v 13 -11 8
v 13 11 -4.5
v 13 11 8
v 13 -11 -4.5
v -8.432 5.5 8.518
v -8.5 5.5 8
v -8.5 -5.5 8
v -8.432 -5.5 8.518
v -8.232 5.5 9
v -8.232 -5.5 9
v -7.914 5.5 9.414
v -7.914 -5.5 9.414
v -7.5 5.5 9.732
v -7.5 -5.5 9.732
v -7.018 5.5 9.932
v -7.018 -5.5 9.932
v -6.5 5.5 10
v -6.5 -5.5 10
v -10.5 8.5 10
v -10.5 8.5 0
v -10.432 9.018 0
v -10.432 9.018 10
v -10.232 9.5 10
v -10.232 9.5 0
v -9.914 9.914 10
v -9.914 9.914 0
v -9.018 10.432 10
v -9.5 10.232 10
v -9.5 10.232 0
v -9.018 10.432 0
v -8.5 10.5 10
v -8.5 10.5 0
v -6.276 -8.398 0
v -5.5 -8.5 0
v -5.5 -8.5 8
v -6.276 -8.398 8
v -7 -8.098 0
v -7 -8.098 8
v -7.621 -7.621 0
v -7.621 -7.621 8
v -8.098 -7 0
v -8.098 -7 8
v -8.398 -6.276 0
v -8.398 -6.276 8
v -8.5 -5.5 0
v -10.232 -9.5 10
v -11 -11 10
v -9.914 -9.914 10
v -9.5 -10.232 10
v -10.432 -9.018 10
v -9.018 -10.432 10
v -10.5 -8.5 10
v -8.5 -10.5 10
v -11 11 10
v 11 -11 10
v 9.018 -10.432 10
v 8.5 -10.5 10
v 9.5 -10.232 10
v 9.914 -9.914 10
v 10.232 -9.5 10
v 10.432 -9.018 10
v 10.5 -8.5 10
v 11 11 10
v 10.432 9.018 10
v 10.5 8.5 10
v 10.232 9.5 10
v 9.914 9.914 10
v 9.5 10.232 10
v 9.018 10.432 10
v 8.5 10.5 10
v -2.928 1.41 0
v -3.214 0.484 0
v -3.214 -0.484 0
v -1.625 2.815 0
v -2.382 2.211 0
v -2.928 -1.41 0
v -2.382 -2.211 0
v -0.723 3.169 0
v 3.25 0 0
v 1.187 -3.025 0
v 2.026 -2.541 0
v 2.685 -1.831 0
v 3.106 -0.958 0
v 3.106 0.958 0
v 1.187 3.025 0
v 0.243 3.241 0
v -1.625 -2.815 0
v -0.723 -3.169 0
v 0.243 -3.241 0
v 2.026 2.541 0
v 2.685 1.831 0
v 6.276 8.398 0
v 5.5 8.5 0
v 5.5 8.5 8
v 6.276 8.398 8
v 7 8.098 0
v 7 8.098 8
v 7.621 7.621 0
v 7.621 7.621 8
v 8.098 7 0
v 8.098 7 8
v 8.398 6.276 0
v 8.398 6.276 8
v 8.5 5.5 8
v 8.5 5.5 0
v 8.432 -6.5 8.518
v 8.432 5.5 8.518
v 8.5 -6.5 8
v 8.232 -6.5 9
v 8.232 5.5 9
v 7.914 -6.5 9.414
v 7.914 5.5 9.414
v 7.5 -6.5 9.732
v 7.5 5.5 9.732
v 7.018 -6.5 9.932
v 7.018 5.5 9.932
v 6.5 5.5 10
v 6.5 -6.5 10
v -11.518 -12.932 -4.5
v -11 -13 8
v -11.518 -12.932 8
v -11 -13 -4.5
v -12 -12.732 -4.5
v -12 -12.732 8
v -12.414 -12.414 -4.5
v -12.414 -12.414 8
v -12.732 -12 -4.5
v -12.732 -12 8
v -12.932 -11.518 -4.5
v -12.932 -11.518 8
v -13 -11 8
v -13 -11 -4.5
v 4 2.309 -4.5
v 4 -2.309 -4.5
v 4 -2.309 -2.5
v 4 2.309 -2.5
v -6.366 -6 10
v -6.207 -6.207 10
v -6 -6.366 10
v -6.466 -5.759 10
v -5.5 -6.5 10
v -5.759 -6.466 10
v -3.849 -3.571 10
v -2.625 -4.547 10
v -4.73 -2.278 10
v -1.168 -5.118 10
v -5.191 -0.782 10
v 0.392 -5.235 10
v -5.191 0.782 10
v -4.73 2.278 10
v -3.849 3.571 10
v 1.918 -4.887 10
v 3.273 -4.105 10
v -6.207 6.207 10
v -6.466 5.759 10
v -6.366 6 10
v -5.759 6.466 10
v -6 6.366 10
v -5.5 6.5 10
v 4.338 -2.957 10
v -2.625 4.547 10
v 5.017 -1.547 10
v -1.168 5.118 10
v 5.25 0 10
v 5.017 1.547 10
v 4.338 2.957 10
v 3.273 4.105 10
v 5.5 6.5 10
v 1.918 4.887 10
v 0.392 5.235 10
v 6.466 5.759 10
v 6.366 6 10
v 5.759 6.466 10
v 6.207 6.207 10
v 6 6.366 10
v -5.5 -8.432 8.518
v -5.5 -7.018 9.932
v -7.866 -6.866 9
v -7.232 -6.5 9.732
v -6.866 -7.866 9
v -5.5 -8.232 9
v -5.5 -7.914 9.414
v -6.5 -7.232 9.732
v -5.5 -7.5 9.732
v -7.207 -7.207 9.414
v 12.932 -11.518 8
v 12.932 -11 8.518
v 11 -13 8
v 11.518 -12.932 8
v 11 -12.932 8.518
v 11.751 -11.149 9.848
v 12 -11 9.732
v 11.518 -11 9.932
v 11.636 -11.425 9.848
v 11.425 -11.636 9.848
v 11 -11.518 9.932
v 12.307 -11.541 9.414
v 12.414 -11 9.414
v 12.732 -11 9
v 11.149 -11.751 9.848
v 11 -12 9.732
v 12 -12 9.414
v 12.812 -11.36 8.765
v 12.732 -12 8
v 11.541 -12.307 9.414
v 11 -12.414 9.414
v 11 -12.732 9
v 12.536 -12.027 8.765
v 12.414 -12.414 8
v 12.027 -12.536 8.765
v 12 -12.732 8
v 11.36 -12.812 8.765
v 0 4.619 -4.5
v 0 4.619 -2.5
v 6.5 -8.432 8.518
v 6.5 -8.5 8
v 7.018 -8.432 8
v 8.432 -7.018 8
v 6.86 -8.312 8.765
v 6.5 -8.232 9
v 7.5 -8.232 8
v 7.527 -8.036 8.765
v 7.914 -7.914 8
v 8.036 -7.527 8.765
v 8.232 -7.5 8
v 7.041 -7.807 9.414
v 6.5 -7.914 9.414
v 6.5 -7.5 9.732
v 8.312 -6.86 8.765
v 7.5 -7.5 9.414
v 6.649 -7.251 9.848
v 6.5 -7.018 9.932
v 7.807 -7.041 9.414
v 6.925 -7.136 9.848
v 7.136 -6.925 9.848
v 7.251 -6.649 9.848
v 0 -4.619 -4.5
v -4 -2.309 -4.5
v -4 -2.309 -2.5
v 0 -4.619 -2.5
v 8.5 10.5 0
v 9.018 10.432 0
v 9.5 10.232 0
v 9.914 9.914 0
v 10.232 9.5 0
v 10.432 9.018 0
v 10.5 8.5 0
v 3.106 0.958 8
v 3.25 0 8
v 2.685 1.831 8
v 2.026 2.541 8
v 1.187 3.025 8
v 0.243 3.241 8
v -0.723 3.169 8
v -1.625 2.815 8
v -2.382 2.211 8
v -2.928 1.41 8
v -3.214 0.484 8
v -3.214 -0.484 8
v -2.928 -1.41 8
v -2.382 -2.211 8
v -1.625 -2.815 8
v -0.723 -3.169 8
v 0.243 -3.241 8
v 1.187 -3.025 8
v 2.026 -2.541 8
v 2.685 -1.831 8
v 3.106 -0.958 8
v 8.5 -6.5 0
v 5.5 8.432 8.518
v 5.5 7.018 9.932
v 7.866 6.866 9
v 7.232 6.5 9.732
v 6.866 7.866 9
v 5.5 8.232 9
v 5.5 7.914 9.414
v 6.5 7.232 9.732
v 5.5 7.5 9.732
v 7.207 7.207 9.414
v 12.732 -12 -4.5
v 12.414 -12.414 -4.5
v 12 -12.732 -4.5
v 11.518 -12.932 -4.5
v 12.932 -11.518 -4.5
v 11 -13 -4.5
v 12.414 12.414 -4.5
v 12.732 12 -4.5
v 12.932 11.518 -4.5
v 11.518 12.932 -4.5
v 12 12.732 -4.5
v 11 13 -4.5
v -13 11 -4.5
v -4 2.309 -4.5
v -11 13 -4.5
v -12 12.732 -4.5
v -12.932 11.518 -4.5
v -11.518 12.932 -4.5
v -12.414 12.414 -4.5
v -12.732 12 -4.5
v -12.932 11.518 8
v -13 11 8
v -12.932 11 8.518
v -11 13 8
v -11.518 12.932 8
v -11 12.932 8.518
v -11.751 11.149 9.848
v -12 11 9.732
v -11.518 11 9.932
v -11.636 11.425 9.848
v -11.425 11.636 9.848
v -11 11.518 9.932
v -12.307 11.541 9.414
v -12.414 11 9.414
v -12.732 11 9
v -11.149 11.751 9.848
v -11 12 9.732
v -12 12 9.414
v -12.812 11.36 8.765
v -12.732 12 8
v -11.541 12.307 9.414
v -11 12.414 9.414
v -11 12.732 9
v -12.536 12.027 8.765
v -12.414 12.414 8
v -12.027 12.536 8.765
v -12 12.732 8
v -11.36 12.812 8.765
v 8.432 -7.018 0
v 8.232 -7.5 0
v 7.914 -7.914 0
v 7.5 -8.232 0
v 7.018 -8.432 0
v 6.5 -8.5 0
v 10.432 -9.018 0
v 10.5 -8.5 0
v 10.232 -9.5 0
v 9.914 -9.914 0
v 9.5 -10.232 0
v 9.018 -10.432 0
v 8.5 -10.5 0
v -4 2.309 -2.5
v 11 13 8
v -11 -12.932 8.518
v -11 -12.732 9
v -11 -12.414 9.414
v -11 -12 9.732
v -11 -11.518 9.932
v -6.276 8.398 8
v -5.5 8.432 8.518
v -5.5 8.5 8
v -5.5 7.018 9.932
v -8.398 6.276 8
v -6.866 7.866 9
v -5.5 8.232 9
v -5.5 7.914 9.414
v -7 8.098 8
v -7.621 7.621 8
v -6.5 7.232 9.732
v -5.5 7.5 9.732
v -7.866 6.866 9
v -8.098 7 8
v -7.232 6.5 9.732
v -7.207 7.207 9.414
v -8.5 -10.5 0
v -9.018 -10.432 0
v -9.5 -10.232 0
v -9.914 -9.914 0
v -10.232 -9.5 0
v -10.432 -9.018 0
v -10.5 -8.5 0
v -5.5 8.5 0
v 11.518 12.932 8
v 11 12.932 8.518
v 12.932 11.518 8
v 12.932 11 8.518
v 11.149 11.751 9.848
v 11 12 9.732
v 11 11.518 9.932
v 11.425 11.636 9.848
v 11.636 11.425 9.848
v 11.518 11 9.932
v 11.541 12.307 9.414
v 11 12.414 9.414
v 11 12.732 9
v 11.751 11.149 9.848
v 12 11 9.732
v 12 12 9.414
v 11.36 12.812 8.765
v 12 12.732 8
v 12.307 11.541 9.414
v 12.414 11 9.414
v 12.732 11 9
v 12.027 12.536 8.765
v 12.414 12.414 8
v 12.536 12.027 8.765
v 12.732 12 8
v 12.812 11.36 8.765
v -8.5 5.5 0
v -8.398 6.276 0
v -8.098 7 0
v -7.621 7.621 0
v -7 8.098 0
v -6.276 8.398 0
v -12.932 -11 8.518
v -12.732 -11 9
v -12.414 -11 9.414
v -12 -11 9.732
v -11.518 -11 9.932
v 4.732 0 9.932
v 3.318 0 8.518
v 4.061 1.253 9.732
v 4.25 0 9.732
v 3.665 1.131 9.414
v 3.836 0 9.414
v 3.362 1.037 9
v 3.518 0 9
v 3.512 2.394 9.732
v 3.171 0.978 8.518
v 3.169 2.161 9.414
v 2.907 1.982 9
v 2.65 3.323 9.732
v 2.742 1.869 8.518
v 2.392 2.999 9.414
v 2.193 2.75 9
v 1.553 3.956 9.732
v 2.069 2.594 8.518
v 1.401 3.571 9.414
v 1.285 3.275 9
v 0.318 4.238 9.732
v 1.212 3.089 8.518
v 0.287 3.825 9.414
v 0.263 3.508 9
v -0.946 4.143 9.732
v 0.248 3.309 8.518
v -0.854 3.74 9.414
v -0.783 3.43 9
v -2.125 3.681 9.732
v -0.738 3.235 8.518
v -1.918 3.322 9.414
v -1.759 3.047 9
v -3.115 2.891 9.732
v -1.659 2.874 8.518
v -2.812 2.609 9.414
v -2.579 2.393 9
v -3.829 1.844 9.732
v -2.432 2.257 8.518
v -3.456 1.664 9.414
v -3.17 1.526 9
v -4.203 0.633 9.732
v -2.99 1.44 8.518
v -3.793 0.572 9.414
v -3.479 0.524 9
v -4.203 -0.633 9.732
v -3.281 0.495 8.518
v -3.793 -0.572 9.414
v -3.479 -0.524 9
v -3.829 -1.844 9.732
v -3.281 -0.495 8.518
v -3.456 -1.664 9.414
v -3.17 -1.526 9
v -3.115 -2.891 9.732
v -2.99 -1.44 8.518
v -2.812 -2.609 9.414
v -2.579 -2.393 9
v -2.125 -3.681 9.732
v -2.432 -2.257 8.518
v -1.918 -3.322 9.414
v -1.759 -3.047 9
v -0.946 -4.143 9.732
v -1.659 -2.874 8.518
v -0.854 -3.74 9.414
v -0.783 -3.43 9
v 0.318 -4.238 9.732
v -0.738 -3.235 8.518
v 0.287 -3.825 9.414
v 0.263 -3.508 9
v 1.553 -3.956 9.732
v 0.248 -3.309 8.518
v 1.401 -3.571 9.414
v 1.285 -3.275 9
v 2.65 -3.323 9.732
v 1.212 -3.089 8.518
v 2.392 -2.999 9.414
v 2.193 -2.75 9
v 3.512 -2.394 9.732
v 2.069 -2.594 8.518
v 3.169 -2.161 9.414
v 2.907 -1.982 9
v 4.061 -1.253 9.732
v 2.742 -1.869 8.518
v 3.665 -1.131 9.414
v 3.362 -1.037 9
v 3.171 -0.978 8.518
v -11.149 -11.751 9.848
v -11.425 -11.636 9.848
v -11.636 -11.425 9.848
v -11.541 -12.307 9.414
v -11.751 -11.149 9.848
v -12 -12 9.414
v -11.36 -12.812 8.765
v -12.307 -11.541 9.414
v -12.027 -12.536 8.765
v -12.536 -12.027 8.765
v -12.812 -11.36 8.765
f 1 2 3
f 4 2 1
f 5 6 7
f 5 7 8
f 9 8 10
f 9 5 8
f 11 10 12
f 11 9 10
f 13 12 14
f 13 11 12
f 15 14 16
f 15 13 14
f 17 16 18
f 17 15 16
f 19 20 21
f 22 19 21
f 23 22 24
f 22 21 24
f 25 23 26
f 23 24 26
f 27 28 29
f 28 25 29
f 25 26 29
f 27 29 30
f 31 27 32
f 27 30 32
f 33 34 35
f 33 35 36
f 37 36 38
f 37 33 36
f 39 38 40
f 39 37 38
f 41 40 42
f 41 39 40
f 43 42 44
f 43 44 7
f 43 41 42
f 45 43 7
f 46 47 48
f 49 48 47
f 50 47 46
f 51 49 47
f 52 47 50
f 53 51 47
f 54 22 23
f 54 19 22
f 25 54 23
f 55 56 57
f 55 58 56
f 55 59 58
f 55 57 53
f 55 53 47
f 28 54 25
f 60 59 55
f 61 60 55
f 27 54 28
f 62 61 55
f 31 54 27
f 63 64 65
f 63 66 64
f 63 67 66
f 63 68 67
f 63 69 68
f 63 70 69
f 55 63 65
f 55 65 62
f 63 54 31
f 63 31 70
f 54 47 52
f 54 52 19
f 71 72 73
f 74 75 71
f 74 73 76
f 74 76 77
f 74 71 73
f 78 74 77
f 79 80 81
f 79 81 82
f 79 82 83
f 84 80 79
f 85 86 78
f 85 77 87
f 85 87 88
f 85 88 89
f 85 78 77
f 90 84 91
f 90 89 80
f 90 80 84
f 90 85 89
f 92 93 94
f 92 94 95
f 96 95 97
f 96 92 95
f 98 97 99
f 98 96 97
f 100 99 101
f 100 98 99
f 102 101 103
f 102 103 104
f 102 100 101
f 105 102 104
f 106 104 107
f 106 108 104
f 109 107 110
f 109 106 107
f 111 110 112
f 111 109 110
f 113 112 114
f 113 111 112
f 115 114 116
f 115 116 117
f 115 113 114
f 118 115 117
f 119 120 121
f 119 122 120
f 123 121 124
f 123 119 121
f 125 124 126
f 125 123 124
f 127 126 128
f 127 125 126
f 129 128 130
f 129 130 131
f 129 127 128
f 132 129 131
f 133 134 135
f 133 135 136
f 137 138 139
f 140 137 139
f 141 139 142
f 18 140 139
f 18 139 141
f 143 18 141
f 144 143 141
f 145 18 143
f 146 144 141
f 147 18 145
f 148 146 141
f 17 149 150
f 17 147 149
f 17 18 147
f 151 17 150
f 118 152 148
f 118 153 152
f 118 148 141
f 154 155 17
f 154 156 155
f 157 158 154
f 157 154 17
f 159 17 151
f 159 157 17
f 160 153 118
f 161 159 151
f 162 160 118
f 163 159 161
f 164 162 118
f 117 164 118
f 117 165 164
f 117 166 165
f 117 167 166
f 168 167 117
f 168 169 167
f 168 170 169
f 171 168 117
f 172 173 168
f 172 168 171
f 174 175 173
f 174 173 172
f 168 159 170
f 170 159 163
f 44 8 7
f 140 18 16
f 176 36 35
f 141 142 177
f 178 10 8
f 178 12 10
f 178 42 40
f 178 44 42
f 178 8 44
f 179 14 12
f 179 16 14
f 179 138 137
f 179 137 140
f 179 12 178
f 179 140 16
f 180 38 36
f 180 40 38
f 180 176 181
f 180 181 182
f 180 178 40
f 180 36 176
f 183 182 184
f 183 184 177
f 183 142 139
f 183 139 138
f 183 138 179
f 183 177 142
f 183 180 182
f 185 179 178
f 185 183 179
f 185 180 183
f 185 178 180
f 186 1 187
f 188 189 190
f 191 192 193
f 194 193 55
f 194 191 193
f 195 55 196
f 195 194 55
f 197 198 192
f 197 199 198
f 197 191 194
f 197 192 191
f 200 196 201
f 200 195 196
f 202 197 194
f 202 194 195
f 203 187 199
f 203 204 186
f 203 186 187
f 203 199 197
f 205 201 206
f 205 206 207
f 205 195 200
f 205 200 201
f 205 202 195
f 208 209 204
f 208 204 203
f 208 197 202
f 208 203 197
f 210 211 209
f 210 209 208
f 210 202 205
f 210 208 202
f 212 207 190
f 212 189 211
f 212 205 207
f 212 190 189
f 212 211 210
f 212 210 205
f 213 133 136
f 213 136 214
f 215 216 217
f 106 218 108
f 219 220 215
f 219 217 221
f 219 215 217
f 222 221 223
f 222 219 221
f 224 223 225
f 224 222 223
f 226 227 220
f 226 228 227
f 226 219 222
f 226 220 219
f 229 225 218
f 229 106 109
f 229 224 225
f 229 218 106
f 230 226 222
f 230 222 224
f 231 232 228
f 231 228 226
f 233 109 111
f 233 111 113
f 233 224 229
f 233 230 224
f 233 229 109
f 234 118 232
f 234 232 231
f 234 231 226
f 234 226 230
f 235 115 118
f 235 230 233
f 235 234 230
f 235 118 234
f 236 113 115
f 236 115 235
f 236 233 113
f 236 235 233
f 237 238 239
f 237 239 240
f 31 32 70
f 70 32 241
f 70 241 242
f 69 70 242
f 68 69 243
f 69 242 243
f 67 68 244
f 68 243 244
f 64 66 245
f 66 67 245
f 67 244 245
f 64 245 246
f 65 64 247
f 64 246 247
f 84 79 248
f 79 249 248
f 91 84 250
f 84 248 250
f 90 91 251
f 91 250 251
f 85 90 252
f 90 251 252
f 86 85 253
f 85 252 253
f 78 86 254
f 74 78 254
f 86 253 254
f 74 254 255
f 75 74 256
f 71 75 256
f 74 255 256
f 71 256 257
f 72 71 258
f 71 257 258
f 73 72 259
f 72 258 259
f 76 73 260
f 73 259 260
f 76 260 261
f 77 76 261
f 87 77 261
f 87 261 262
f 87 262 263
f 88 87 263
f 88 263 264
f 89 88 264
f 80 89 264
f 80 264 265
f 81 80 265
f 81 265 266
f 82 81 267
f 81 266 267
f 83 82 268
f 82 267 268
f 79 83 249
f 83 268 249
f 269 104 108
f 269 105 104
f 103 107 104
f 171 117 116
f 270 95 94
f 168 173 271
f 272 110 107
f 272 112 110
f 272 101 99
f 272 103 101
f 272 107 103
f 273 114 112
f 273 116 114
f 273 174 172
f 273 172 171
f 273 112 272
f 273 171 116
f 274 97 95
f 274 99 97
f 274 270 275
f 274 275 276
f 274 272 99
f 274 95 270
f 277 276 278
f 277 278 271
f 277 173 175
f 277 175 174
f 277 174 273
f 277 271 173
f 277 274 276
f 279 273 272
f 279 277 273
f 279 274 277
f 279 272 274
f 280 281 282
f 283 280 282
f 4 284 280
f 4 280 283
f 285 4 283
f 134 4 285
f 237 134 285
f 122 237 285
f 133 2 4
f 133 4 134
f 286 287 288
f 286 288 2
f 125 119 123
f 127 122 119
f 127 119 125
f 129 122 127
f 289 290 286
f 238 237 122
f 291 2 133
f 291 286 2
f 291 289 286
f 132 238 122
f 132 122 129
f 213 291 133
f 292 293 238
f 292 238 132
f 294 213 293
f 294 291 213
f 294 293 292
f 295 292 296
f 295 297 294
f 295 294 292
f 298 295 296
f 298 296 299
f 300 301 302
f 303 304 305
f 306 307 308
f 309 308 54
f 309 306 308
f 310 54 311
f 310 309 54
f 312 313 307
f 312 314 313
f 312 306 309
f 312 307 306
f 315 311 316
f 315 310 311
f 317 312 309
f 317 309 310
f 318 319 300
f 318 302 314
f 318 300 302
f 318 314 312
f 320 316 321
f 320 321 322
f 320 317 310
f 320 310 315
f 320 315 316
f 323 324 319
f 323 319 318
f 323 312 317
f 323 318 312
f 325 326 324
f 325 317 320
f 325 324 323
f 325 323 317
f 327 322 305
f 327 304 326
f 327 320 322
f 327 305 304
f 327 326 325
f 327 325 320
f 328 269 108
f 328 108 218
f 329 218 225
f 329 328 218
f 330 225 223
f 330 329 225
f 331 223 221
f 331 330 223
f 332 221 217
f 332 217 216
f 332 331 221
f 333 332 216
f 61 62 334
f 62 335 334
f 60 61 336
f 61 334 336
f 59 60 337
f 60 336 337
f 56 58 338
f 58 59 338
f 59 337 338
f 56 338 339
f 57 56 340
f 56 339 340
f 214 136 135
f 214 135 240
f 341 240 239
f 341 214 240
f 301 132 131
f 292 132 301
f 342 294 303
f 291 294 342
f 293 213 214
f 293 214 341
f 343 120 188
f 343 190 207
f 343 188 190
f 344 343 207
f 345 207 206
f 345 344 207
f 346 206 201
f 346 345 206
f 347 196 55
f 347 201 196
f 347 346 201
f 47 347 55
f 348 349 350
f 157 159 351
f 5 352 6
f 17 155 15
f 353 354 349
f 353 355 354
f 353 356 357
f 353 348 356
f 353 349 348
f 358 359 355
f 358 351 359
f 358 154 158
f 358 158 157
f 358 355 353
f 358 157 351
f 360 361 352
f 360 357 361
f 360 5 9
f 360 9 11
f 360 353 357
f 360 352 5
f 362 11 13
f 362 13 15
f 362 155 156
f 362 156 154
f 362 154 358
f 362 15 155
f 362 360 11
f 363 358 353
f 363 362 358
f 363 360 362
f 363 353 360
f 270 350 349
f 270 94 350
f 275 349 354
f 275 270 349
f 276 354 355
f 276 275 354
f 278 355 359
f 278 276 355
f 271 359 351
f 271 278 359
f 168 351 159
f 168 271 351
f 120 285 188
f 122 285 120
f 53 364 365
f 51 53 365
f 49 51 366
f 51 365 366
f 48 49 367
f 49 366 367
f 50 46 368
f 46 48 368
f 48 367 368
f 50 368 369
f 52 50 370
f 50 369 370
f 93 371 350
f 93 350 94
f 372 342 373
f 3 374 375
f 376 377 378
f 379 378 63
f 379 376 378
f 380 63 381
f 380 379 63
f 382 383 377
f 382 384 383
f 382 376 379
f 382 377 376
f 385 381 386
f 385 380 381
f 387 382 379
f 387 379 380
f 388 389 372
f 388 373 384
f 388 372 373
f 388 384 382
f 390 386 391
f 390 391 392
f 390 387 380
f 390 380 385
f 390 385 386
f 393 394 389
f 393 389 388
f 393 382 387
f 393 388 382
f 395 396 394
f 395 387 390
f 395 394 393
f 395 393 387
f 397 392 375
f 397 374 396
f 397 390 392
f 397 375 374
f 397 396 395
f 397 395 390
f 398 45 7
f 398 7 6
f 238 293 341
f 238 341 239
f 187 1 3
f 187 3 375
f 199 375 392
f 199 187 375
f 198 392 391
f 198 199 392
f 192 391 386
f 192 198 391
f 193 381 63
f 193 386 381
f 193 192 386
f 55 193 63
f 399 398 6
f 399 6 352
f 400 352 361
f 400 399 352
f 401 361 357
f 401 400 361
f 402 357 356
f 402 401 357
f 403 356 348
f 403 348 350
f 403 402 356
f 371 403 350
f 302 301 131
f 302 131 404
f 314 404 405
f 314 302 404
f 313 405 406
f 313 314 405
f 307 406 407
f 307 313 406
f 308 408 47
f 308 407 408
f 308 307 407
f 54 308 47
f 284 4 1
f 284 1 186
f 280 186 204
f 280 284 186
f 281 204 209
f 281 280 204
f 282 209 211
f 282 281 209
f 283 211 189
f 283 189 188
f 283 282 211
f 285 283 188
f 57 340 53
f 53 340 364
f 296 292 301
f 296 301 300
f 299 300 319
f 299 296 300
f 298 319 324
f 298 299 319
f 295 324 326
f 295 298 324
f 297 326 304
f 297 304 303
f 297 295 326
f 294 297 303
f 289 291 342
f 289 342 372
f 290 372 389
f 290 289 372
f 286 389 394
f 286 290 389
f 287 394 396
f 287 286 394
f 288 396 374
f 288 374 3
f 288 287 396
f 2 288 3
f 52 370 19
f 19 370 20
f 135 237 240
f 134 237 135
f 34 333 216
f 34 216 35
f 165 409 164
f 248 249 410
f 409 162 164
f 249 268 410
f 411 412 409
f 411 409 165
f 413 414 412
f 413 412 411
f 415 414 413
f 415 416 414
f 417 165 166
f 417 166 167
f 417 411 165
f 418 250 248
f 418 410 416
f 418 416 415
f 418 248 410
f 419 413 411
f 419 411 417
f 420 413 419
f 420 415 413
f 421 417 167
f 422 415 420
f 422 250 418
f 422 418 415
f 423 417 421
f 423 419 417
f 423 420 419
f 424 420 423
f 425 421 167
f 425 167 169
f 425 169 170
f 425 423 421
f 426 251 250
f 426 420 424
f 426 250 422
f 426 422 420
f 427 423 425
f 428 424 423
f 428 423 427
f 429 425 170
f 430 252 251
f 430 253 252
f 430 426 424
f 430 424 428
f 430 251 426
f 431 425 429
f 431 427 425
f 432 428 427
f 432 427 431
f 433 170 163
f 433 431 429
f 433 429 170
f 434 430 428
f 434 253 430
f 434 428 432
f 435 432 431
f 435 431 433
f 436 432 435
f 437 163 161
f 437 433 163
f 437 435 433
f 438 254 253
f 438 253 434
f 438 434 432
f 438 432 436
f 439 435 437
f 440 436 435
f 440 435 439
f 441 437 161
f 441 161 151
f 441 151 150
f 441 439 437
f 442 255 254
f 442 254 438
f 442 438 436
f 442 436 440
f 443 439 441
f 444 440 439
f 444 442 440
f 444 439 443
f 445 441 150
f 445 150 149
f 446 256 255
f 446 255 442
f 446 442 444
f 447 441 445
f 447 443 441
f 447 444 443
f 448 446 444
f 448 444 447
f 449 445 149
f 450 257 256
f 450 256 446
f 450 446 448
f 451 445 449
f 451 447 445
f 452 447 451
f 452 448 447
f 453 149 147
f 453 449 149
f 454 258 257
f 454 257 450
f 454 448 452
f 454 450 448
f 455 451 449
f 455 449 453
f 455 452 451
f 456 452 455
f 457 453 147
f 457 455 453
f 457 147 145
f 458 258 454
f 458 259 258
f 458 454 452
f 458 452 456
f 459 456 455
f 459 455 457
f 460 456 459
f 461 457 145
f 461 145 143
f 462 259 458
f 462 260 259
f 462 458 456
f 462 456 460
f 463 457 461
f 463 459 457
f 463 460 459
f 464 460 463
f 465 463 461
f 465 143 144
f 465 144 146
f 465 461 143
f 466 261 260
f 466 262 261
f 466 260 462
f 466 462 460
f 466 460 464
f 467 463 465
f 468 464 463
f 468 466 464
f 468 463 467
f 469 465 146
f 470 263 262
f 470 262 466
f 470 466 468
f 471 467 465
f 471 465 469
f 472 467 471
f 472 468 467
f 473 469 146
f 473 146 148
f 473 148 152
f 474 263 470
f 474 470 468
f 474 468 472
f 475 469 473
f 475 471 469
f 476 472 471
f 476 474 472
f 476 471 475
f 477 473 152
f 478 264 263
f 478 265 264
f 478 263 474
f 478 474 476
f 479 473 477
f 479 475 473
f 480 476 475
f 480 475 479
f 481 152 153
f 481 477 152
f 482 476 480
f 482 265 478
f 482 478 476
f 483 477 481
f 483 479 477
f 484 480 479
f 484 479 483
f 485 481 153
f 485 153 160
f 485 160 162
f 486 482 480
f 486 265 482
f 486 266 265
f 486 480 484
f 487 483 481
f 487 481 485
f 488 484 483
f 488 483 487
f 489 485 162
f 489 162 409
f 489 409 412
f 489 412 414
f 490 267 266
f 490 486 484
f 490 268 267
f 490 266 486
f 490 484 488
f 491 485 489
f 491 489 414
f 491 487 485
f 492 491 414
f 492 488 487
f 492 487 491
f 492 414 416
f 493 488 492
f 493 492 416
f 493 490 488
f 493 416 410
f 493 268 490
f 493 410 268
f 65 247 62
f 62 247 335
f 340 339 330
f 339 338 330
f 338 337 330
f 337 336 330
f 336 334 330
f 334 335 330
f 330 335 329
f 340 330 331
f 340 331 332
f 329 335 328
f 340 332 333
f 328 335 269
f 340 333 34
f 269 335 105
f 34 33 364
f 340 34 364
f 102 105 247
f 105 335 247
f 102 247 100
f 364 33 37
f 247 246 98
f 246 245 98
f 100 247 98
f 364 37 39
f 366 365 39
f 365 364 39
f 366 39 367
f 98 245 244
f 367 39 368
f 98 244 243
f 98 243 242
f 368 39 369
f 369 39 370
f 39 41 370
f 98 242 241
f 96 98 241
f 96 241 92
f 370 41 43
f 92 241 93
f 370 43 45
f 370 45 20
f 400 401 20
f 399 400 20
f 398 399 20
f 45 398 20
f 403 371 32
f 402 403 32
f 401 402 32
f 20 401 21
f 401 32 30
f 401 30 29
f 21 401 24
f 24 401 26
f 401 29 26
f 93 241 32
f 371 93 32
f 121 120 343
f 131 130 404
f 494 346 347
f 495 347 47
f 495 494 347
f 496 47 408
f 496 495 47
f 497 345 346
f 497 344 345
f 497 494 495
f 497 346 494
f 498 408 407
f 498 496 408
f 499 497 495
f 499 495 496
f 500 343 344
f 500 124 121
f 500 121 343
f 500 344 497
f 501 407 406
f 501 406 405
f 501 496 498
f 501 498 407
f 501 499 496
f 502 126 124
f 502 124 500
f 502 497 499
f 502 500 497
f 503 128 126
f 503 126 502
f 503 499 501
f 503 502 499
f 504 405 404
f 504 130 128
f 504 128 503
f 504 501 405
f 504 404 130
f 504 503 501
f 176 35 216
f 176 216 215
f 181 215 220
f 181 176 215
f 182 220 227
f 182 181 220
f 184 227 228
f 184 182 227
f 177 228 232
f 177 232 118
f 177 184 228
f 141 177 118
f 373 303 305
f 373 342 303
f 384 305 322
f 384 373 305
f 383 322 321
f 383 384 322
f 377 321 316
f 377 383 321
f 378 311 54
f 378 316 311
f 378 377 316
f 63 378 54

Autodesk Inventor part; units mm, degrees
ref_plane "YZ Plane" through (0, 0, 0) normal (1, 0, 0) x (0, 1, 0)
ref_plane "XZ Plane" through (0, 0, 0) normal (0, 1, 0) x (-1, 0, 0)
ref_plane "XY Plane" through (0, 0, 0) normal (0, 0, 1) x (1, 0, 0)
sketch "Schizzo1" plane through (0, 0, 0) normal (0, 0, 1) x (1, 0, 0)
  line L0 (6.5, -8.5) -> (-5.5, -8.5)
  line L1 (-8.5, -5.5) -> (-8.5, 5.5)
  line L2 (-5.5, 8.5) -> (5.5, 8.5)
  line L3 (8.5, 5.5) -> (8.5, -6.5)
  arc A0 (6.5, -8.5) -> (8.5, -6.5) centre (6.5, -6.5) ccw
  arc A1 (-8.5, -5.5) -> (-5.5, -8.5) centre (-5.5, -5.5) ccw
  arc A2 (-5.5, 8.5) -> (-8.5, 5.5) centre (-5.5, 5.5) ccw
  arc A3 (8.5, 5.5) -> (5.5, 8.5) centre (5.5, 5.5) ccw
  point P0 (0, 0)
  point P1 (0, 0)
  point P2 (8.5, -8.5)
  point P3 (-8.5, -8.5)
  point P4 (-8.5, 8.5)
  point P5 (8.5, 8.5)
  dimension "d0" = 17
  dimension "d44" = 2
  dimension "d45" = 3
extrude "Estrusione1" add sketch "Schizzo1" along normal blind 10
sketch "Schizzo2" plane through (0, 0, 0) normal (0, 0, -1) x (-1, 0, 0)
  line L0 (11, -13) -> (-11, -13)
  line L1 (-13, -11) -> (-13, 11)
  line L2 (-11, 13) -> (11, 13)
  line L3 (13, 11) -> (13, -11)
  line L4 (13, -13) -> (-13, 13) construction
  line L5 (-13, -13) -> (13, 13) construction
  arc A0 (13, 11) -> (11, 13) centre (11, 11) ccw
  arc A1 (11, -13) -> (13, -11) centre (11, -11) ccw
  arc A2 (-13, -11) -> (-11, -13) centre (-11, -11) ccw
  arc A3 (-11, 13) -> (-13, 11) centre (-11, 11) ccw
  point P0 (0, 0)
  dimension "d3" = 26
  dimension "d4" = 26
  dimension "d145" = 2
extrude "Estrusione2" add sketch "Schizzo2" along normal blind 4.5
sketch "Schizzo12" plane through (0, 0, 0) normal (0, 0, 1) x (1, 0, 0)
  line L0 (-10.5, -8.5) -> (-10.5, 8.5)
  line L1 (-8.5, 10.5) -> (8.5, 10.5)
  line L2 (10.5, 8.5) -> (10.5, -8.5)
  line L3 (8.5, -10.5) -> (-8.5, -10.5)
  line L4 (-13, -11) -> (-13, 11)
  line L5 (-11, 13) -> (11, 13)
  line L6 (13, 11) -> (13, -11)
  line L7 (11, -13) -> (-11, -13)
  arc A0 (10.5, 8.5) -> (8.5, 10.5) centre (8.5, 8.5) ccw
  arc A1 (13, 11) -> (11, 13) centre (11, 11) ccw
  arc A2 (11, -13) -> (13, -11) centre (11, -11) ccw
  arc A3 (8.5, -10.5) -> (10.5, -8.5) centre (8.5, -8.5) ccw
  arc A4 (-13, -11) -> (-11, -13) centre (-11, -11) ccw
  arc A5 (-10.5, -8.5) -> (-8.5, -10.5) centre (-8.5, -8.5) ccw
  arc A6 (-11, 13) -> (-13, 11) centre (-11, 11) ccw
  arc A7 (-8.5, 10.5) -> (-10.5, 8.5) centre (-8.5, 8.5) ccw
  point P0 (0, 0)
  point P1 (0, 0)
  point P2 (-10.5, -10.5)
  point P3 (-10.5, 10.5)
  point P4 (10.5, 10.5)
  point P5 (10.5, -10.5)
  point P6 (0, 0)
  point P7 (-13, -13)
  point P8 (-13, 13)
  point P9 (13, 13)
  point P10 (13, -13)
  dimension "d110" = 21
  dimension "d111" = 26
  dimension "d112" = 2
extrude "Estrusione6" add sketch "Schizzo12" along normal blind 10
fillet "Raccordo3" radius 2 1 edges at (0, -13, 10)
fillet "Raccordo8" radius 2 1 edges at (0, 8.5, 10)
sketch "Schizzo20" plane through (0, 0, 10) normal (0, 0, 1) x (1, 0, 0)
  circle A0 centre (0, 0) radius 3.25
  dimension "d176" = 6.5
extrude "Estrusione9" cut sketch "Schizzo20" against normal blind 10
fillet "Raccordo9" radius 2 1 edges at (-3.25, 0, 10)
sketch "Schizzo21" plane through (0, 0, -4.5) normal (0, 0, -1) x (-1, 0, 0)
  circle A0 centre (0, 0) radius 4
  line L0 (-4, 2.3094) -> (0, 4.6188)
  line L1 (0, 4.6188) -> (4, 2.3094)
  line L2 (4, 2.3094) -> (4, -2.3094)
  line L3 (4, -2.3094) -> (0, -4.6188)
  line L4 (0, -4.6188) -> (-4, -2.3094)
  line L5 (-4, -2.3094) -> (-4, 2.3094)
  point P0 (-4, 0)
  dimension "d180" = 8
extrude "Estrusione10" cut sketch "Schizzo21" against normal blind 2
properties part number "2_Connettore_inf_sup"
